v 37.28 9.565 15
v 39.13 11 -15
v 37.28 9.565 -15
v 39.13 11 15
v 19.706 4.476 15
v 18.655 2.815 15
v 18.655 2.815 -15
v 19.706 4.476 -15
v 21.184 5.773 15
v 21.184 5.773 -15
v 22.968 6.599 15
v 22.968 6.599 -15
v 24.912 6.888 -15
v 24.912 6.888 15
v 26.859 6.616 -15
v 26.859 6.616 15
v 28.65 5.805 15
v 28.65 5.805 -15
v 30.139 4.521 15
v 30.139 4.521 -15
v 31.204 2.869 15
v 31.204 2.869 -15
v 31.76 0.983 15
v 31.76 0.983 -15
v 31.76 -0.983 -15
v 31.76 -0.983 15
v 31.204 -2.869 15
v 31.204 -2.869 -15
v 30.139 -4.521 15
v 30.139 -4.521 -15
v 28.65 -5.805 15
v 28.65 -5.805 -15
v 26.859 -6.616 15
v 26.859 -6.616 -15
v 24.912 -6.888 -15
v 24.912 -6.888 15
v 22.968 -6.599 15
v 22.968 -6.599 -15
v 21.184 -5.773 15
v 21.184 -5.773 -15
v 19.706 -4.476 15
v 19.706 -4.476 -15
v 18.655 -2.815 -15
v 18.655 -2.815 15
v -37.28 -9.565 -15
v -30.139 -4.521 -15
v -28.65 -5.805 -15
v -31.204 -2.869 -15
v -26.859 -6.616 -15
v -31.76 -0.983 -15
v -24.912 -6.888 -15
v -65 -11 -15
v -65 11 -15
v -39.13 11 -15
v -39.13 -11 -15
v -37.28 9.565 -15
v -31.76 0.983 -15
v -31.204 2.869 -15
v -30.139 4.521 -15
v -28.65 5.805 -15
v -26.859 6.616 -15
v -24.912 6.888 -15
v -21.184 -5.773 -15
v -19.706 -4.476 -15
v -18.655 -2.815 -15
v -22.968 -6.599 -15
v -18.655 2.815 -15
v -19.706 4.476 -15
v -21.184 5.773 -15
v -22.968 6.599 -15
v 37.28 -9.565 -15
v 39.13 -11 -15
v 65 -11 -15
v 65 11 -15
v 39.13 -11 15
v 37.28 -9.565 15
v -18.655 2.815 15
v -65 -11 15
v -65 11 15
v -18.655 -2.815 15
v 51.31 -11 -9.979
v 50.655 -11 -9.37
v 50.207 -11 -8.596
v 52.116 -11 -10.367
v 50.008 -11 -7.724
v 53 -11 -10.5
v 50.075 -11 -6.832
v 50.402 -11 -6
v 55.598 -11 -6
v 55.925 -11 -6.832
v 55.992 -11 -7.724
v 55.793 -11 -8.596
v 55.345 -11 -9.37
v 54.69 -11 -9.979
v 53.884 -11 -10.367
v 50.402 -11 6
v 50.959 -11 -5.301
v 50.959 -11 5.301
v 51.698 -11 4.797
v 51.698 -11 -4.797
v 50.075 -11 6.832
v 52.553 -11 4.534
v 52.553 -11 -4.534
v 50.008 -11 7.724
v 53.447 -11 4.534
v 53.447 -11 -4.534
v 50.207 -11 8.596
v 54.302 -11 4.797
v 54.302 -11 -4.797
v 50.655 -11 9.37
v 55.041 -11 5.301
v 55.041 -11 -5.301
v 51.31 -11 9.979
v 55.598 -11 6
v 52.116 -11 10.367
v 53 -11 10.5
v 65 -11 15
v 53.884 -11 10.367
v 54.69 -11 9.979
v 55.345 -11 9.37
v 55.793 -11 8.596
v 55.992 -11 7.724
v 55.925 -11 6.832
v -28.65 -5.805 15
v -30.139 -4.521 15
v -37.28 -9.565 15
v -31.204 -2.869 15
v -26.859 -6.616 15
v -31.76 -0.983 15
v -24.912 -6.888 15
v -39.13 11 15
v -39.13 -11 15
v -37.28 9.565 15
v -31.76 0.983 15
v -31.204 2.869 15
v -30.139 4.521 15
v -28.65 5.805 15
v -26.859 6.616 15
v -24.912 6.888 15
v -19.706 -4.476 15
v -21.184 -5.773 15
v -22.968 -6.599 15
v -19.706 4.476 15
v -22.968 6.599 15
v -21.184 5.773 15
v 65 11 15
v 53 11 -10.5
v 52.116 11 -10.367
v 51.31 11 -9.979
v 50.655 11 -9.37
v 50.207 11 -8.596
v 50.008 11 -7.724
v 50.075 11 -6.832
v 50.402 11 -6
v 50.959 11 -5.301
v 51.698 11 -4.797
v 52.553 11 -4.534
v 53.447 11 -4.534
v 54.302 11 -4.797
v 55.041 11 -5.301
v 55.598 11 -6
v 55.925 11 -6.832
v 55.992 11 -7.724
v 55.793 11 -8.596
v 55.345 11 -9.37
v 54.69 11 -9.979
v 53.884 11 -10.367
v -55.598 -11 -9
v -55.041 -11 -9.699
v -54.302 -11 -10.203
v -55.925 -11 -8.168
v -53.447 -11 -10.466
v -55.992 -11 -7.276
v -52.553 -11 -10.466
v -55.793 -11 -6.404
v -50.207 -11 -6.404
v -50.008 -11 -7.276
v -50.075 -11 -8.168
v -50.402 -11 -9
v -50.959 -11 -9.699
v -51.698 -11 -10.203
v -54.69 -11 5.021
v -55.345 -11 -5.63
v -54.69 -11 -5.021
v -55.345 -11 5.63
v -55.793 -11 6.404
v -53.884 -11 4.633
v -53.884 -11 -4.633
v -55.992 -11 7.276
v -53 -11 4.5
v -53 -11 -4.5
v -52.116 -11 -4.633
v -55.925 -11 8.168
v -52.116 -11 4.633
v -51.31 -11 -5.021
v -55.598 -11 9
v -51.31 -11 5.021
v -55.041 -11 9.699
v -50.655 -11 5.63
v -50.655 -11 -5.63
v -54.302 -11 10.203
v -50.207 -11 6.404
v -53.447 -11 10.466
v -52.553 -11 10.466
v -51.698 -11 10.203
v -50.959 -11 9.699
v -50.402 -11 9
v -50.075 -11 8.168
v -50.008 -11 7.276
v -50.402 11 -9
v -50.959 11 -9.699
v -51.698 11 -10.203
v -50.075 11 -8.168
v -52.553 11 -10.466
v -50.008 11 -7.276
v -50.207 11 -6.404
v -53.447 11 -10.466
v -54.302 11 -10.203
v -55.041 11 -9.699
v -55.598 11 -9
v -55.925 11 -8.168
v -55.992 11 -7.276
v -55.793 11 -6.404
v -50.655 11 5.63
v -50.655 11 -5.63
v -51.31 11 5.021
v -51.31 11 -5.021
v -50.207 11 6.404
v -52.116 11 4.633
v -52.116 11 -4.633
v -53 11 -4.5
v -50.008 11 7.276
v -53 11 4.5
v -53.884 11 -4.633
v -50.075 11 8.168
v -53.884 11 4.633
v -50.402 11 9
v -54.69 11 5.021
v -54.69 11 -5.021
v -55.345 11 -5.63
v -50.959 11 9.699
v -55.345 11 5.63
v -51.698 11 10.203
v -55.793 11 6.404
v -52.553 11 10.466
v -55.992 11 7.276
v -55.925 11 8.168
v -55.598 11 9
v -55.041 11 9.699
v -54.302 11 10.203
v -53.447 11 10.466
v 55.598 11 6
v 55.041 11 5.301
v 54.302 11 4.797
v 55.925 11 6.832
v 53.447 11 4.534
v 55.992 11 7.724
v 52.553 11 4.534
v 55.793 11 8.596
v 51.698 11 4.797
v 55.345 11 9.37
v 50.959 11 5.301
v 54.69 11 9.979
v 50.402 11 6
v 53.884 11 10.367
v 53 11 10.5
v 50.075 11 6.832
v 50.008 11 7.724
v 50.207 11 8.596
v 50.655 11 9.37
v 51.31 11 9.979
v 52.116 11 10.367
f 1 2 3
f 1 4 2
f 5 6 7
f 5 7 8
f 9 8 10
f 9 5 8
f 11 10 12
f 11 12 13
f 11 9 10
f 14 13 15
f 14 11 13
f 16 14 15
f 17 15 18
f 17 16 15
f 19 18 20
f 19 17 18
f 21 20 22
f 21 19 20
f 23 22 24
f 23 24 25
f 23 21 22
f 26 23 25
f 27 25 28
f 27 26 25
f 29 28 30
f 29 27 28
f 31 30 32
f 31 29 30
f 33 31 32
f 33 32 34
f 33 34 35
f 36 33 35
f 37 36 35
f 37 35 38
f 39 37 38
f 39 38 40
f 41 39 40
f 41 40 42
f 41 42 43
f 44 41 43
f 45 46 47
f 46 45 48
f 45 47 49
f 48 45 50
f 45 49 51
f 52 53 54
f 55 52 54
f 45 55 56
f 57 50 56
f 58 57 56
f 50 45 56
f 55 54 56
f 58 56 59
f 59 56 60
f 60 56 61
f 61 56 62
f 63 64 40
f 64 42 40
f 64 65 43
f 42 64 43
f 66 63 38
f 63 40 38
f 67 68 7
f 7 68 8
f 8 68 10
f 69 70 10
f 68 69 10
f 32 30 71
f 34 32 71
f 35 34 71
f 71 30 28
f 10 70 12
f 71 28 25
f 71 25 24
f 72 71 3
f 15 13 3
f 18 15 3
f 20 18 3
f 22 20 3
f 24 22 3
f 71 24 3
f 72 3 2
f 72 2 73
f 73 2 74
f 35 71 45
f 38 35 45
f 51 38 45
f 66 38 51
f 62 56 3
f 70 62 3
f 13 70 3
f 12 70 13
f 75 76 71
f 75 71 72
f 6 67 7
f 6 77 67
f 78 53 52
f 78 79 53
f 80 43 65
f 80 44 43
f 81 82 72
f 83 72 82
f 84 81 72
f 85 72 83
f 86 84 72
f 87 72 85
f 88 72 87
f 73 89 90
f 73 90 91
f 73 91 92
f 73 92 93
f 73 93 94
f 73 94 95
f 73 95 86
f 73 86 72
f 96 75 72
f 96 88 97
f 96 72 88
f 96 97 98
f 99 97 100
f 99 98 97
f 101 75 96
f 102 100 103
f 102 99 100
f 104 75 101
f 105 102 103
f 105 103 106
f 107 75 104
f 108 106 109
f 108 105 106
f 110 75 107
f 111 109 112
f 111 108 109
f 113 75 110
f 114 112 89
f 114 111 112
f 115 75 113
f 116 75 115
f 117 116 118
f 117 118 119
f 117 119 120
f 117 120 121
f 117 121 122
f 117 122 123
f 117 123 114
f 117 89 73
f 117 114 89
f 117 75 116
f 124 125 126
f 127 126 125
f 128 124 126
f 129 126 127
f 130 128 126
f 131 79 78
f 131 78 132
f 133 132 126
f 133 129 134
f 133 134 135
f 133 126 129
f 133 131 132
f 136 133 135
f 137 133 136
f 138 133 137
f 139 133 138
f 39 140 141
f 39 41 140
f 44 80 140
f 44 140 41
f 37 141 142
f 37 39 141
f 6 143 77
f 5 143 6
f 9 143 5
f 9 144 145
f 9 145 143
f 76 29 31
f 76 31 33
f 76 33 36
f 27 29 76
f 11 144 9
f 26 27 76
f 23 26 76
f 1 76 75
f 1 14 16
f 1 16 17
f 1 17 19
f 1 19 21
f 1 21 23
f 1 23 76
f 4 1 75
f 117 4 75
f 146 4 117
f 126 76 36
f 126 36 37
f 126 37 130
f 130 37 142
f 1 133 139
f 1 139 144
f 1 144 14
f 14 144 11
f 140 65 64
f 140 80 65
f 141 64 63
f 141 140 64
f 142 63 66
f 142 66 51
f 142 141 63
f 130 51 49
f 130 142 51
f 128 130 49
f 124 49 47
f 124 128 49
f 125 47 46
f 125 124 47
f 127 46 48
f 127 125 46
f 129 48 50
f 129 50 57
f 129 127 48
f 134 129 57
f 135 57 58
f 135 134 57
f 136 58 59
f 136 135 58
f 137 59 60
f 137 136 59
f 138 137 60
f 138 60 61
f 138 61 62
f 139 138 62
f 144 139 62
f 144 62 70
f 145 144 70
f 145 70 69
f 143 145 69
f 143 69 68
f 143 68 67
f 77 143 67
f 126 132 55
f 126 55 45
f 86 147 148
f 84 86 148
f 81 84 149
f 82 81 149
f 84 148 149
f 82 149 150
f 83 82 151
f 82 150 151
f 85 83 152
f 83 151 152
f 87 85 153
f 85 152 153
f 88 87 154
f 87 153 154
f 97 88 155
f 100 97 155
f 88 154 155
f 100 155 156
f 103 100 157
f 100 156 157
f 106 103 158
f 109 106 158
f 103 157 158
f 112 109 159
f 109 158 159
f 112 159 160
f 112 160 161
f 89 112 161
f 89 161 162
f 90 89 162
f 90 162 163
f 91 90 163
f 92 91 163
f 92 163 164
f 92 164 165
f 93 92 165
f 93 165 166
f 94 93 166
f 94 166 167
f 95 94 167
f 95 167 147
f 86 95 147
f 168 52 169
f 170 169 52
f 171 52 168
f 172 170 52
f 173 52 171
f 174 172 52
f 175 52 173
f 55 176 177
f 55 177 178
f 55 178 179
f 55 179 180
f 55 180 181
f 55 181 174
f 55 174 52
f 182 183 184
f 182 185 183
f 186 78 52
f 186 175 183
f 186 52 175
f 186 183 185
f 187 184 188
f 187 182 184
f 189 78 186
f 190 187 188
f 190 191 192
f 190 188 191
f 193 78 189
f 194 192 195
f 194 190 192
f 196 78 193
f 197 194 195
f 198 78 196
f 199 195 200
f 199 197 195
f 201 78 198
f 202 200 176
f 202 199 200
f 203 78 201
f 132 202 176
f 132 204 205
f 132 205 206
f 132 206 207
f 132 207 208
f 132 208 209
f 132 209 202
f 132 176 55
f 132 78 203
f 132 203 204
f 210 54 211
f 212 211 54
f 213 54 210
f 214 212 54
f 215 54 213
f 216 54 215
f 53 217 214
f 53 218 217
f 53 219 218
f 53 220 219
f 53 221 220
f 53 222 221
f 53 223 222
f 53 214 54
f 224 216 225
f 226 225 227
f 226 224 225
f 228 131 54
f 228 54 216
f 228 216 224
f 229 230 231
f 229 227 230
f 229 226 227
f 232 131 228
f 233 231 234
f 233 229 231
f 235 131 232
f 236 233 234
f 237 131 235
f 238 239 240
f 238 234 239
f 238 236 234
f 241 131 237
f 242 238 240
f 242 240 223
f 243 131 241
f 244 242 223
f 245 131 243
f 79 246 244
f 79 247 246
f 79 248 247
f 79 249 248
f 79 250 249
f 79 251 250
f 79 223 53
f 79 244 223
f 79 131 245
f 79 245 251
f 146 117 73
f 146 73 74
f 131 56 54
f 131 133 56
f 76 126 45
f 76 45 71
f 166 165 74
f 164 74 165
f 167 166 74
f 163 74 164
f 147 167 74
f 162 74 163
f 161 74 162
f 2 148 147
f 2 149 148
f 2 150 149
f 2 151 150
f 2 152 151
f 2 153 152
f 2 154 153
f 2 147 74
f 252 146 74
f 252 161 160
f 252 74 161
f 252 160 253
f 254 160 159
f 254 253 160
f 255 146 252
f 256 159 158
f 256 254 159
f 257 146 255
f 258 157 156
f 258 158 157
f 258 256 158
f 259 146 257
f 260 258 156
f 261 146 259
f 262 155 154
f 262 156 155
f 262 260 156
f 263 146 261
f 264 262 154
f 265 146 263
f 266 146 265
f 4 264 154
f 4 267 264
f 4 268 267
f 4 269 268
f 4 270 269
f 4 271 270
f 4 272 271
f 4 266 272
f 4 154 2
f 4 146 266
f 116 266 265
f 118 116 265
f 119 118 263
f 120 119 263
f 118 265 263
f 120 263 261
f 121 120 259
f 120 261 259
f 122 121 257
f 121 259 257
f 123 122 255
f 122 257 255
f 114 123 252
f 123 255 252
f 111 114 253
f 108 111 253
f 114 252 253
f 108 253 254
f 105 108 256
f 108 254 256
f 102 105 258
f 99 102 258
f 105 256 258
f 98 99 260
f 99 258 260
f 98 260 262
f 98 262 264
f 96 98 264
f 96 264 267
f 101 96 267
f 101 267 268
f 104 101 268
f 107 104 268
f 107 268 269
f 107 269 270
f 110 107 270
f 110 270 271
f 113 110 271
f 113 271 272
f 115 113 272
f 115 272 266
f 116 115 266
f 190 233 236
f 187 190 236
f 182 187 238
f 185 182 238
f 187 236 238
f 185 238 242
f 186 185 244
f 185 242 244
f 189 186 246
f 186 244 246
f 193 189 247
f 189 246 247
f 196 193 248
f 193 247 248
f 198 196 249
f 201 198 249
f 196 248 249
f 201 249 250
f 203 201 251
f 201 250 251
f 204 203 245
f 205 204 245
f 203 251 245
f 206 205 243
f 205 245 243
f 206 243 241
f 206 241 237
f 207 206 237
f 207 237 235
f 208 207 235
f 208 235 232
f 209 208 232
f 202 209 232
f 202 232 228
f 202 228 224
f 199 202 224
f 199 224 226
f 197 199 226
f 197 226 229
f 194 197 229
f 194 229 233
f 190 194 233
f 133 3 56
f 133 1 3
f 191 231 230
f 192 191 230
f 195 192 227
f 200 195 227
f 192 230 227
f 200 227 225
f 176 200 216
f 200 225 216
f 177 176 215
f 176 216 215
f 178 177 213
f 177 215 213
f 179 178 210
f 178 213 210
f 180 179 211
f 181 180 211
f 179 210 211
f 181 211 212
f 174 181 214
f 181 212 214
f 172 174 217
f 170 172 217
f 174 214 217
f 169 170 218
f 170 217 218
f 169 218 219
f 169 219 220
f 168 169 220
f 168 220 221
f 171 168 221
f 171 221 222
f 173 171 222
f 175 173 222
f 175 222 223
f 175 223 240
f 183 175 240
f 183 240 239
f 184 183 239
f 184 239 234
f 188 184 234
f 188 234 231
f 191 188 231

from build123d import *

# Parameters (mm, degrees)
BOSS_EXTRUDE1_DEPTH = 15
SKETCH5_R           = 3
CUT_EXTRUDE1_DEPTH  = 71.242437315


with BuildPart() as part:
    # Sketch2 → Boss-Extrude1 (new, symmetric)
    with BuildSketch(Plane.XY):
        Polygon((-65, 11), (-65, -11), (-39.13, -11), (-37.28, -9.565), (37.28, -9.565), (39.13, -11), (65, -11), (65, 11), (39.13, 11), (37.28, 9.565), (-37.28, 9.565), (-39.13, 11), align=None)
        with BuildLine():
            Line((0, 2.815), (18.655, 2.815))
            ThreePointArc((18.655, 2.815), (31.83, 0), (18.655, -2.815))
            Line((18.655, -2.815), (0, -2.815))
            Line((0, -2.815), (-18.655, -2.815))
            ThreePointArc((-18.655, -2.815), (-31.83, 0), (-18.655, 2.815))
            Line((-18.655, 2.815), (0, 2.815))
        make_face(mode=Mode.SUBTRACT)
    extrude(amount=BOSS_EXTRUDE1_DEPTH, both=True)

    # Sketch5 → Cut-Extrude1 (cut, through all)
    with BuildSketch(Plane(origin=(0, 11, 0), x_dir=(1, 0, 0), z_dir=(0, 1, 0))):
        with Locations(Location((-53, 7.5, 0), (0, 0, 270))):
            Circle(SKETCH5_R)
        with Locations(Location((-53, -7.5, 0), (0, 0, 90))):
            Circle(SKETCH5_R)
        with Locations(Location((53, -7.5, 0), (0, 0, 270))):
            Circle(SKETCH5_R)
        with Locations(Location((53, 7.5, 0), (0, 0, 90))):
            Circle(SKETCH5_R)
    extrude(amount=-CUT_EXTRUDE1_DEPTH, mode=Mode.SUBTRACT)


solid = part.part
